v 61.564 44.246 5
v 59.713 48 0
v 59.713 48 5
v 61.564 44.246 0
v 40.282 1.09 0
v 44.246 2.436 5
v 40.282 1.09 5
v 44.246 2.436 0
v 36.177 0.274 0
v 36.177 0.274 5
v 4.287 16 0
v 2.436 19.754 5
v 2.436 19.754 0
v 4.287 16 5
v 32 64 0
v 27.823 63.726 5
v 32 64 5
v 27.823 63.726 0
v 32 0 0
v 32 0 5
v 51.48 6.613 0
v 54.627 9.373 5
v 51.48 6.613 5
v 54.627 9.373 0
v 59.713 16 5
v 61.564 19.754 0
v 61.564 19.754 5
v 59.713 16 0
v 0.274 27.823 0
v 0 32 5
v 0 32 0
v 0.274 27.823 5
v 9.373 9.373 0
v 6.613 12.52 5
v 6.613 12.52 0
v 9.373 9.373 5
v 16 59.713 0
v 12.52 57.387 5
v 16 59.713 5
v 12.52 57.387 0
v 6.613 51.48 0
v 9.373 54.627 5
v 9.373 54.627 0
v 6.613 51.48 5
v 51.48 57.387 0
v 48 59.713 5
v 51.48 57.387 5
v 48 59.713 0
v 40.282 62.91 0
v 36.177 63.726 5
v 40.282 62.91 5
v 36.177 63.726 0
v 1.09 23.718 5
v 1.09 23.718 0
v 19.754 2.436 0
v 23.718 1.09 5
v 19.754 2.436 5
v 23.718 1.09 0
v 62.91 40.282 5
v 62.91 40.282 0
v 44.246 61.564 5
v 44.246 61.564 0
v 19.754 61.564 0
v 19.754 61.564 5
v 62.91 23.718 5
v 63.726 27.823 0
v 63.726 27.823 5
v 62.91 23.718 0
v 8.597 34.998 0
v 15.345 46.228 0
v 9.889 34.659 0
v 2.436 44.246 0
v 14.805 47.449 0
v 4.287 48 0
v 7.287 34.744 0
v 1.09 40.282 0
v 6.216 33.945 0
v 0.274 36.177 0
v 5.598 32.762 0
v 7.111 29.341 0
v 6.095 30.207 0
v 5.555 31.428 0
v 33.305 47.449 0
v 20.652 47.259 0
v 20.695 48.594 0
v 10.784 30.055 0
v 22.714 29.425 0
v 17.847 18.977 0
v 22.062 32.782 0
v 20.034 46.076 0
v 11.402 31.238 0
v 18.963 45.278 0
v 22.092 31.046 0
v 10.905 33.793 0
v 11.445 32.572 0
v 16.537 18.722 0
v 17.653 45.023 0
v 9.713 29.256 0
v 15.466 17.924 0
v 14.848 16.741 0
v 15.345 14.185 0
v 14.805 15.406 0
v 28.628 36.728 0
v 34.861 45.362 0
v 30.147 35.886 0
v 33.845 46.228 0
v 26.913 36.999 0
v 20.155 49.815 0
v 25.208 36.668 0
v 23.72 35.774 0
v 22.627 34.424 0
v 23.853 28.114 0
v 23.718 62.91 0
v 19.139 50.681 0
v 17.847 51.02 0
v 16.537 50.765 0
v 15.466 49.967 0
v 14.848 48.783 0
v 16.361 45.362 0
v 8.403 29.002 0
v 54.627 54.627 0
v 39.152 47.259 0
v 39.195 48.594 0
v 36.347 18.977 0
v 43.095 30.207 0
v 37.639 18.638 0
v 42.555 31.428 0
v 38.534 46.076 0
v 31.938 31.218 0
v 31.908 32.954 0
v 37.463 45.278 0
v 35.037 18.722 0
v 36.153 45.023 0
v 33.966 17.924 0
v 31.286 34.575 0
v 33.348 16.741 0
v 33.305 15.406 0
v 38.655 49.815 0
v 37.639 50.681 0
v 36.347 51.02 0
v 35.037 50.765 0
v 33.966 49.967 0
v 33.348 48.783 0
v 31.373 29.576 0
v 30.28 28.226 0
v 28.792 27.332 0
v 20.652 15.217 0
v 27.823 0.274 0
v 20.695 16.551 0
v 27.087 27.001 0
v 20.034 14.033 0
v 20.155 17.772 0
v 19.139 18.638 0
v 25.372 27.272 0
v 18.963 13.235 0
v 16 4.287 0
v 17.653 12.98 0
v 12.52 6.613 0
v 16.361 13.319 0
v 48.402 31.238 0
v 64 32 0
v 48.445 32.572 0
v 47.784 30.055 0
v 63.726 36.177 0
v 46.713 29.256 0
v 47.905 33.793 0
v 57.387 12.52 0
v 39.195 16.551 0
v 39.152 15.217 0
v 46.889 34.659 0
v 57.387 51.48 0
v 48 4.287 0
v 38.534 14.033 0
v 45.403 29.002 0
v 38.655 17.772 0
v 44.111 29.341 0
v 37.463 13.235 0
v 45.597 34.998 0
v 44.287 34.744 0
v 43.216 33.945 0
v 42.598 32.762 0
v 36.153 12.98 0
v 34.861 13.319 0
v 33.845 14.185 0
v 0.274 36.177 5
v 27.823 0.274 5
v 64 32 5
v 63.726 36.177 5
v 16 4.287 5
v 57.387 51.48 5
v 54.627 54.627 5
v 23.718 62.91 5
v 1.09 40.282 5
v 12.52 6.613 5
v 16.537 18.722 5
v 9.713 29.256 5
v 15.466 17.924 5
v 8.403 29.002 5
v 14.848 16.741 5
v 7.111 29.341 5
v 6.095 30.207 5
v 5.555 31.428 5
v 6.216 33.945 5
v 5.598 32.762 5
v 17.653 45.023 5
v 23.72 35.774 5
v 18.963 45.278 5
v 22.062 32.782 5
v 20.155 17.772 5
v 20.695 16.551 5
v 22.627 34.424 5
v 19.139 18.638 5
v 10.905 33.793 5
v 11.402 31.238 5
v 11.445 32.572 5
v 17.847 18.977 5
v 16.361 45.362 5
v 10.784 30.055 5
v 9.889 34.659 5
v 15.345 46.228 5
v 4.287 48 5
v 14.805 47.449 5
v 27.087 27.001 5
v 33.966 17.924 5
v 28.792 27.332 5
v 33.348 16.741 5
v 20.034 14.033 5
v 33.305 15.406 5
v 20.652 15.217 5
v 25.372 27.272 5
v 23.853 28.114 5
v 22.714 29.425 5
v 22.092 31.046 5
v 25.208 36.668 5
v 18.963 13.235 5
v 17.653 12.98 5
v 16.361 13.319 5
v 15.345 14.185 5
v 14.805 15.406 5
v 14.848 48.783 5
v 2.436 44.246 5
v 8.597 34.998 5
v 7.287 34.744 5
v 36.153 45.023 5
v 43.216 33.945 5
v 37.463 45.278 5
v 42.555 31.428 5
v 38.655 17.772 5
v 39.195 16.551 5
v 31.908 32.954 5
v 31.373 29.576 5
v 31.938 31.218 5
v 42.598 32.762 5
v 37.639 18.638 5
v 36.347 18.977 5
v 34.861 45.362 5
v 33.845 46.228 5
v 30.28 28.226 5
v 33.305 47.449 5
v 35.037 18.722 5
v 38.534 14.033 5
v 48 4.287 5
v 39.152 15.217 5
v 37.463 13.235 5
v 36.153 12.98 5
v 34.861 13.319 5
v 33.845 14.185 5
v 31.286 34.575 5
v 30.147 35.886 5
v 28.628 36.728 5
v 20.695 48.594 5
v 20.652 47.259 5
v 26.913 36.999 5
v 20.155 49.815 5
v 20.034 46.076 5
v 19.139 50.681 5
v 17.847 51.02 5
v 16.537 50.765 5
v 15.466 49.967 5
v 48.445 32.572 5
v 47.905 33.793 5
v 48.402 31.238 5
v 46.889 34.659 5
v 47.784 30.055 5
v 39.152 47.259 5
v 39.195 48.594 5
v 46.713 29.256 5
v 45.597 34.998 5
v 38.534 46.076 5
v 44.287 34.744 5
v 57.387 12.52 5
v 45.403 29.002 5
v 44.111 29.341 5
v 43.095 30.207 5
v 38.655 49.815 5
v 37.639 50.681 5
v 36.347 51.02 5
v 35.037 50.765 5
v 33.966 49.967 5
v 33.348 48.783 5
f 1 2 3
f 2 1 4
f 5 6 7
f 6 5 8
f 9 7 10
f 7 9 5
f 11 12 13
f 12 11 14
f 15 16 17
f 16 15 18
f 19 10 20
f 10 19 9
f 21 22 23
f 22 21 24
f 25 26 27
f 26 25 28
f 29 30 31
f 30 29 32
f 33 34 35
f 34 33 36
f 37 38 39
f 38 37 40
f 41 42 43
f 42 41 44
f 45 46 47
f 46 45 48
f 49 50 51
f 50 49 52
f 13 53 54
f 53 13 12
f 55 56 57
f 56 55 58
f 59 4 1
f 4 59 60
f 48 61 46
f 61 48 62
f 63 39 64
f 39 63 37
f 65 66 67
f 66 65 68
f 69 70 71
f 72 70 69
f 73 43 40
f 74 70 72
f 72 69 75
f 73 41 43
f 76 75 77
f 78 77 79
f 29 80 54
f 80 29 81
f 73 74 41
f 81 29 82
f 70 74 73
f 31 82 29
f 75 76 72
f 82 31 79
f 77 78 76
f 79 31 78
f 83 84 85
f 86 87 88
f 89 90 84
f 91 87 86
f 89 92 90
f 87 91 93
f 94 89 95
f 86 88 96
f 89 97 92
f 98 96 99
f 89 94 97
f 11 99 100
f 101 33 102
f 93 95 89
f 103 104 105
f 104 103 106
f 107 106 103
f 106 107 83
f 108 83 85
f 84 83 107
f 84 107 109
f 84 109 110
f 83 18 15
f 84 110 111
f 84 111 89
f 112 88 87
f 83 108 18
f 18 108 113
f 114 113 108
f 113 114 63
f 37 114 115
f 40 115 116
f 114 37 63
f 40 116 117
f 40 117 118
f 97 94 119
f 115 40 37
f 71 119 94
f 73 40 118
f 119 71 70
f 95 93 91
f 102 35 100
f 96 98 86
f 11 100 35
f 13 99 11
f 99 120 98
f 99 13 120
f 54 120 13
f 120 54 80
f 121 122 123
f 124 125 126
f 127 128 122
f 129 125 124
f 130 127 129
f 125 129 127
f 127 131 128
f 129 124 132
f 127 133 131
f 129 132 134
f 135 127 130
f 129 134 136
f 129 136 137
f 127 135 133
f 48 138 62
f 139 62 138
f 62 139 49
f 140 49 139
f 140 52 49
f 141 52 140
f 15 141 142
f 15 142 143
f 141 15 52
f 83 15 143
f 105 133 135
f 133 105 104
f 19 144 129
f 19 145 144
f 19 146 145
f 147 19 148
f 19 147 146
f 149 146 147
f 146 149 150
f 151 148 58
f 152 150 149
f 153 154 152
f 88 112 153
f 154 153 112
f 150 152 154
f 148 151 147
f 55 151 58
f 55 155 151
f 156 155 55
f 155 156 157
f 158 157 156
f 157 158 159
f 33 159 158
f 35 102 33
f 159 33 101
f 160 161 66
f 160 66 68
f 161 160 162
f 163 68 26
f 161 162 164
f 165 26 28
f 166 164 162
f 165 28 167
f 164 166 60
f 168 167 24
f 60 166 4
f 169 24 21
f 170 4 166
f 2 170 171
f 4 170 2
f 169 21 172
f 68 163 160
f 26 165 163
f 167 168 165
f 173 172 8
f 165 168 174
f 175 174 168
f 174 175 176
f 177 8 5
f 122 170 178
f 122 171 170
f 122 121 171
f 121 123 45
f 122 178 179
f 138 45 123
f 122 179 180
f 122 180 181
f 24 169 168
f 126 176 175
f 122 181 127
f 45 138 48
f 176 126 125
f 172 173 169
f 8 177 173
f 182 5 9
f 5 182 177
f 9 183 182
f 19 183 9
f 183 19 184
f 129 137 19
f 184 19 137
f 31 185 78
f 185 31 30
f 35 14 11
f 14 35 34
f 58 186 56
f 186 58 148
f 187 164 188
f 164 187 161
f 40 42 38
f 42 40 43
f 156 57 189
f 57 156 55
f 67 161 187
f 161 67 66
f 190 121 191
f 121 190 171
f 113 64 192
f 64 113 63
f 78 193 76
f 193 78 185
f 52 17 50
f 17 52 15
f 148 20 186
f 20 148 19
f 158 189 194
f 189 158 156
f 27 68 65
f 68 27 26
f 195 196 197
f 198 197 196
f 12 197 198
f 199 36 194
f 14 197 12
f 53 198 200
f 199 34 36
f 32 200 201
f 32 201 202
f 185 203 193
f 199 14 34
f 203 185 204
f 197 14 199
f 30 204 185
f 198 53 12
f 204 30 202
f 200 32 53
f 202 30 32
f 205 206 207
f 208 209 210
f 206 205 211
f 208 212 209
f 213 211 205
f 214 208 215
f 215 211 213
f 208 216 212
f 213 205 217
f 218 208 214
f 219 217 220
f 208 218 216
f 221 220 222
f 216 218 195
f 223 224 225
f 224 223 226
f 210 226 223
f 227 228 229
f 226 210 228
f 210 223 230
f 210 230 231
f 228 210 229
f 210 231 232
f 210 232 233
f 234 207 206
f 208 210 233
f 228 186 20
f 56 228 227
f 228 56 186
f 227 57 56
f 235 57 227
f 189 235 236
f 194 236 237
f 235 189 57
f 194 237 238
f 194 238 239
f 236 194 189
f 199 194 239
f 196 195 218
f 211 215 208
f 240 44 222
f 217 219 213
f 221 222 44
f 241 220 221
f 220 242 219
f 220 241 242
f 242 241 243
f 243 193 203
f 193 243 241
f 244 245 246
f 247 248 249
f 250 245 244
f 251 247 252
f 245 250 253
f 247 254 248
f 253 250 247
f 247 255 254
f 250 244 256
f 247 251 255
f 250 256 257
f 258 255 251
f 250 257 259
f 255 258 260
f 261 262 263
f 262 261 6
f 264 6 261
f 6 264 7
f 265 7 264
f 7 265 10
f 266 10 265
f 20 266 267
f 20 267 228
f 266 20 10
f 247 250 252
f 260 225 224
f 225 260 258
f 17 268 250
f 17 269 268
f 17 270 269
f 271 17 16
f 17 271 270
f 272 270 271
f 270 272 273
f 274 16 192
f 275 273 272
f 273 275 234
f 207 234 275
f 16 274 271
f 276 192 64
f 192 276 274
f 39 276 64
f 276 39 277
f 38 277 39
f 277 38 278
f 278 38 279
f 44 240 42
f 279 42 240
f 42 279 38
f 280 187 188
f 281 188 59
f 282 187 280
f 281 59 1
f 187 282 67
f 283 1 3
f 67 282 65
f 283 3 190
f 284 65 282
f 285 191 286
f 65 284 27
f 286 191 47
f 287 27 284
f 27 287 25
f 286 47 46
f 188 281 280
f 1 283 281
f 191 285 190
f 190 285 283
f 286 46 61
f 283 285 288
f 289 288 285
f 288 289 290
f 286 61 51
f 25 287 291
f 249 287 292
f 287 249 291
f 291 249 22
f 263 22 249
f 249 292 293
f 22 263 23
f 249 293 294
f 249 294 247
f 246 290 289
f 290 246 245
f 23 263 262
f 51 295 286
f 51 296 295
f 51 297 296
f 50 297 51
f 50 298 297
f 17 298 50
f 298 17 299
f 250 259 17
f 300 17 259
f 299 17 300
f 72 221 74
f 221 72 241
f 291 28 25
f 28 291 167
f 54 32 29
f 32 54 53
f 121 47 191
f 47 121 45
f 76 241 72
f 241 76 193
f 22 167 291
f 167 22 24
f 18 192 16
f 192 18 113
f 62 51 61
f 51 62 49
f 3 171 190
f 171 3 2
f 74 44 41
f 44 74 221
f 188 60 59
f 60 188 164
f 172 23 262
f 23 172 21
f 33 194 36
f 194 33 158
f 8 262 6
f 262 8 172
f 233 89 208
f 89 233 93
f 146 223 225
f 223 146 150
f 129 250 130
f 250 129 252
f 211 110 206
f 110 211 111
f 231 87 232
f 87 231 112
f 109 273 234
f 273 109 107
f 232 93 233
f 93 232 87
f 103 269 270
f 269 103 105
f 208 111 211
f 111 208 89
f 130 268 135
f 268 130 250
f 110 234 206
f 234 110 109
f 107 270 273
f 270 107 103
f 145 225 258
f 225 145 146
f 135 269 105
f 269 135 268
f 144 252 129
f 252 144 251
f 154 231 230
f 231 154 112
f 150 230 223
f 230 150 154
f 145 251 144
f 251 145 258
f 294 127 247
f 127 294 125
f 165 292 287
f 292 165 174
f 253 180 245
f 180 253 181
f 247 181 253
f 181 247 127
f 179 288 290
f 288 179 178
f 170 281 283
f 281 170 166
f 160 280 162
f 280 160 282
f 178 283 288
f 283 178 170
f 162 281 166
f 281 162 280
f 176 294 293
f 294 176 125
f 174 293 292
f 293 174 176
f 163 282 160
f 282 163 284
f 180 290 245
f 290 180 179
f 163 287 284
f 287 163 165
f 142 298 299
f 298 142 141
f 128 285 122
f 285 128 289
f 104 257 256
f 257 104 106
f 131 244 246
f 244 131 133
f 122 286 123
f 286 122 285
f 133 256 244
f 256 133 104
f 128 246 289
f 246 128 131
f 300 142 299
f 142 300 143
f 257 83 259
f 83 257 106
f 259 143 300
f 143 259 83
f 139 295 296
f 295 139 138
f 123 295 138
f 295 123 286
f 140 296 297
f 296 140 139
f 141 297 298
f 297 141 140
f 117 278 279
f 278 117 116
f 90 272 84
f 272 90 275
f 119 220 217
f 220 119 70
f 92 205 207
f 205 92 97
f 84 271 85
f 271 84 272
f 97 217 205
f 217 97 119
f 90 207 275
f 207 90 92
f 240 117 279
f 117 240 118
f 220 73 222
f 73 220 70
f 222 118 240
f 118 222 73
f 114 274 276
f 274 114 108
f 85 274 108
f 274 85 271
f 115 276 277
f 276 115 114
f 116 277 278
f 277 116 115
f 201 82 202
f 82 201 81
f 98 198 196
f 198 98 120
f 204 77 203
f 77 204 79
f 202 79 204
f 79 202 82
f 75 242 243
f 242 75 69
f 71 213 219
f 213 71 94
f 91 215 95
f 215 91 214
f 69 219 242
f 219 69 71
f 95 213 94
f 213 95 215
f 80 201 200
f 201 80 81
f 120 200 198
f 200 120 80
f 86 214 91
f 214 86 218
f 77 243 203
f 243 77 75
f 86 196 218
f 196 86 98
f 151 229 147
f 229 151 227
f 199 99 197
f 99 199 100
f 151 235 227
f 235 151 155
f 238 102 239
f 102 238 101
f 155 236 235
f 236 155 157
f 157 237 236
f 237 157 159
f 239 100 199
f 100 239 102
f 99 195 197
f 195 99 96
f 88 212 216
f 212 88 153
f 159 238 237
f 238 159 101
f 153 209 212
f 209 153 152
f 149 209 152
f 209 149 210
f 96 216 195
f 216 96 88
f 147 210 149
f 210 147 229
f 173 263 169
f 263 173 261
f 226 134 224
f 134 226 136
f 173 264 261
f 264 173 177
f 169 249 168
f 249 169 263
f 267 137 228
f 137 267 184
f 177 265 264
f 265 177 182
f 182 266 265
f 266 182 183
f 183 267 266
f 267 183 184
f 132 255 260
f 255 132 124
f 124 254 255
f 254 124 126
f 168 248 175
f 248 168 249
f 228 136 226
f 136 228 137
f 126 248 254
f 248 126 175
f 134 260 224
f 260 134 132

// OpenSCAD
$fn = 32;

// ----------------------------------------------------------------------
// Cam plate: eccentric cam, base R32
// ----------------------------------------------------------------------

// --- parameters (mm) ---
base_r = 32;              // base circle radius
lobe_h = 10;              // cam lobe rise
bore_r = 5;               // shaft bore radius
plate_t = 5;              // plate thickness, Z (extrusion height)
ecc = 5;                  // disc eccentricity
ring_r = 18.5;            // lightening ring radius
bolt_r = 3;               // lightening hole radius

profile = [[64, 32], [63.726, 36.177], [62.91, 40.282], [61.564, 44.246], [59.713, 48], [57.387, 51.48], [54.627, 54.627], [51.48, 57.387], [48, 59.713], [44.246, 61.564], [40.282, 62.91], [36.177, 63.726], [32, 64], [27.823, 63.726], [23.718, 62.91], [19.754, 61.564], [16, 59.713], [12.52, 57.387], [9.373, 54.627], [6.613, 51.48], [4.287, 48], [2.436, 44.246], [1.09, 40.282], [0.274, 36.177], [0, 32], [0.274, 27.823], [1.09, 23.718], [2.436, 19.754], [4.287, 16], [6.613, 12.52], [9.373, 9.373], [12.52, 6.613], [16, 4.287], [19.754, 2.436], [23.718, 1.09], [27.823, 0.274], [32, 0], [36.177, 0.274], [40.282, 1.09], [44.246, 2.436], [48, 4.287], [51.48, 6.613], [54.627, 9.373], [57.387, 12.52], [59.713, 16], [61.564, 19.754], [62.91, 23.718], [63.726, 27.823]];  // primary outline, 48 points, counter clockwise
void_1 = [[31.908, 32.954], [31.286, 34.575], [30.147, 35.886], [28.628, 36.728], [26.913, 36.999], [25.208, 36.668], [23.72, 35.774], [22.627, 34.424], [22.062, 32.782], [22.092, 31.046], [22.714, 29.425], [23.853, 28.114], [25.372, 27.272], [27.087, 27.001], [28.792, 27.332], [30.28, 28.226], [31.373, 29.576], [31.938, 31.218]];  // shaft bore, 18 points
void_2 = [[48.445, 32.572], [47.905, 33.793], [46.889, 34.659], [45.597, 34.998], [44.287, 34.744], [43.216, 33.945], [42.598, 32.762], [42.555, 31.428], [43.095, 30.207], [44.111, 29.341], [45.403, 29.002], [46.713, 29.256], [47.784, 30.055], [48.402, 31.238]];  // lightening hole 1, 14 points
void_3 = [[39.195, 48.594], [38.655, 49.815], [37.639, 50.681], [36.347, 51.02], [35.037, 50.765], [33.966, 49.967], [33.348, 48.783], [33.305, 47.449], [33.845, 46.228], [34.861, 45.362], [36.153, 45.023], [37.463, 45.278], [38.534, 46.076], [39.152, 47.259]];  // lightening hole 2, 14 points
void_4 = [[20.695, 48.594], [20.155, 49.815], [19.139, 50.681], [17.847, 51.02], [16.537, 50.765], [15.466, 49.967], [14.848, 48.783], [14.805, 47.449], [15.345, 46.228], [16.361, 45.362], [17.653, 45.023], [18.963, 45.278], [20.034, 46.076], [20.652, 47.259]];  // lightening hole 3, 14 points
void_5 = [[11.445, 32.572], [10.905, 33.793], [9.889, 34.659], [8.597, 34.998], [7.287, 34.744], [6.216, 33.945], [5.598, 32.762], [5.555, 31.428], [6.095, 30.207], [7.111, 29.341], [8.403, 29.002], [9.713, 29.256], [10.784, 30.055], [11.402, 31.238]];  // lightening hole 4, 14 points
void_6 = [[20.695, 16.551], [20.155, 17.772], [19.139, 18.638], [17.847, 18.977], [16.537, 18.722], [15.466, 17.924], [14.848, 16.741], [14.805, 15.406], [15.345, 14.185], [16.361, 13.319], [17.653, 12.98], [18.963, 13.235], [20.034, 14.033], [20.652, 15.217]];  // lightening hole 5, 14 points
void_7 = [[39.195, 16.551], [38.655, 17.772], [37.639, 18.638], [36.347, 18.977], [35.037, 18.722], [33.966, 17.924], [33.348, 16.741], [33.305, 15.406], [33.845, 14.185], [34.861, 13.319], [36.153, 12.98], [37.463, 13.235], [38.534, 14.033], [39.152, 15.217]];  // lightening hole 6, 14 points

// --- the one profile operation ---
difference() {
  linear_extrude(height = plate_t) polygon(points = profile);
  translate([0, 0, -1])
    linear_extrude(height = plate_t + 2) polygon(points = void_1);
  translate([0, 0, -1])
    linear_extrude(height = plate_t + 2) polygon(points = void_2);
  translate([0, 0, -1])
    linear_extrude(height = plate_t + 2) polygon(points = void_3);
  translate([0, 0, -1])
    linear_extrude(height = plate_t + 2) polygon(points = void_4);
  translate([0, 0, -1])
    linear_extrude(height = plate_t + 2) polygon(points = void_5);
  translate([0, 0, -1])
    linear_extrude(height = plate_t + 2) polygon(points = void_6);
  translate([0, 0, -1])
    linear_extrude(height = plate_t + 2) polygon(points = void_7);
}
